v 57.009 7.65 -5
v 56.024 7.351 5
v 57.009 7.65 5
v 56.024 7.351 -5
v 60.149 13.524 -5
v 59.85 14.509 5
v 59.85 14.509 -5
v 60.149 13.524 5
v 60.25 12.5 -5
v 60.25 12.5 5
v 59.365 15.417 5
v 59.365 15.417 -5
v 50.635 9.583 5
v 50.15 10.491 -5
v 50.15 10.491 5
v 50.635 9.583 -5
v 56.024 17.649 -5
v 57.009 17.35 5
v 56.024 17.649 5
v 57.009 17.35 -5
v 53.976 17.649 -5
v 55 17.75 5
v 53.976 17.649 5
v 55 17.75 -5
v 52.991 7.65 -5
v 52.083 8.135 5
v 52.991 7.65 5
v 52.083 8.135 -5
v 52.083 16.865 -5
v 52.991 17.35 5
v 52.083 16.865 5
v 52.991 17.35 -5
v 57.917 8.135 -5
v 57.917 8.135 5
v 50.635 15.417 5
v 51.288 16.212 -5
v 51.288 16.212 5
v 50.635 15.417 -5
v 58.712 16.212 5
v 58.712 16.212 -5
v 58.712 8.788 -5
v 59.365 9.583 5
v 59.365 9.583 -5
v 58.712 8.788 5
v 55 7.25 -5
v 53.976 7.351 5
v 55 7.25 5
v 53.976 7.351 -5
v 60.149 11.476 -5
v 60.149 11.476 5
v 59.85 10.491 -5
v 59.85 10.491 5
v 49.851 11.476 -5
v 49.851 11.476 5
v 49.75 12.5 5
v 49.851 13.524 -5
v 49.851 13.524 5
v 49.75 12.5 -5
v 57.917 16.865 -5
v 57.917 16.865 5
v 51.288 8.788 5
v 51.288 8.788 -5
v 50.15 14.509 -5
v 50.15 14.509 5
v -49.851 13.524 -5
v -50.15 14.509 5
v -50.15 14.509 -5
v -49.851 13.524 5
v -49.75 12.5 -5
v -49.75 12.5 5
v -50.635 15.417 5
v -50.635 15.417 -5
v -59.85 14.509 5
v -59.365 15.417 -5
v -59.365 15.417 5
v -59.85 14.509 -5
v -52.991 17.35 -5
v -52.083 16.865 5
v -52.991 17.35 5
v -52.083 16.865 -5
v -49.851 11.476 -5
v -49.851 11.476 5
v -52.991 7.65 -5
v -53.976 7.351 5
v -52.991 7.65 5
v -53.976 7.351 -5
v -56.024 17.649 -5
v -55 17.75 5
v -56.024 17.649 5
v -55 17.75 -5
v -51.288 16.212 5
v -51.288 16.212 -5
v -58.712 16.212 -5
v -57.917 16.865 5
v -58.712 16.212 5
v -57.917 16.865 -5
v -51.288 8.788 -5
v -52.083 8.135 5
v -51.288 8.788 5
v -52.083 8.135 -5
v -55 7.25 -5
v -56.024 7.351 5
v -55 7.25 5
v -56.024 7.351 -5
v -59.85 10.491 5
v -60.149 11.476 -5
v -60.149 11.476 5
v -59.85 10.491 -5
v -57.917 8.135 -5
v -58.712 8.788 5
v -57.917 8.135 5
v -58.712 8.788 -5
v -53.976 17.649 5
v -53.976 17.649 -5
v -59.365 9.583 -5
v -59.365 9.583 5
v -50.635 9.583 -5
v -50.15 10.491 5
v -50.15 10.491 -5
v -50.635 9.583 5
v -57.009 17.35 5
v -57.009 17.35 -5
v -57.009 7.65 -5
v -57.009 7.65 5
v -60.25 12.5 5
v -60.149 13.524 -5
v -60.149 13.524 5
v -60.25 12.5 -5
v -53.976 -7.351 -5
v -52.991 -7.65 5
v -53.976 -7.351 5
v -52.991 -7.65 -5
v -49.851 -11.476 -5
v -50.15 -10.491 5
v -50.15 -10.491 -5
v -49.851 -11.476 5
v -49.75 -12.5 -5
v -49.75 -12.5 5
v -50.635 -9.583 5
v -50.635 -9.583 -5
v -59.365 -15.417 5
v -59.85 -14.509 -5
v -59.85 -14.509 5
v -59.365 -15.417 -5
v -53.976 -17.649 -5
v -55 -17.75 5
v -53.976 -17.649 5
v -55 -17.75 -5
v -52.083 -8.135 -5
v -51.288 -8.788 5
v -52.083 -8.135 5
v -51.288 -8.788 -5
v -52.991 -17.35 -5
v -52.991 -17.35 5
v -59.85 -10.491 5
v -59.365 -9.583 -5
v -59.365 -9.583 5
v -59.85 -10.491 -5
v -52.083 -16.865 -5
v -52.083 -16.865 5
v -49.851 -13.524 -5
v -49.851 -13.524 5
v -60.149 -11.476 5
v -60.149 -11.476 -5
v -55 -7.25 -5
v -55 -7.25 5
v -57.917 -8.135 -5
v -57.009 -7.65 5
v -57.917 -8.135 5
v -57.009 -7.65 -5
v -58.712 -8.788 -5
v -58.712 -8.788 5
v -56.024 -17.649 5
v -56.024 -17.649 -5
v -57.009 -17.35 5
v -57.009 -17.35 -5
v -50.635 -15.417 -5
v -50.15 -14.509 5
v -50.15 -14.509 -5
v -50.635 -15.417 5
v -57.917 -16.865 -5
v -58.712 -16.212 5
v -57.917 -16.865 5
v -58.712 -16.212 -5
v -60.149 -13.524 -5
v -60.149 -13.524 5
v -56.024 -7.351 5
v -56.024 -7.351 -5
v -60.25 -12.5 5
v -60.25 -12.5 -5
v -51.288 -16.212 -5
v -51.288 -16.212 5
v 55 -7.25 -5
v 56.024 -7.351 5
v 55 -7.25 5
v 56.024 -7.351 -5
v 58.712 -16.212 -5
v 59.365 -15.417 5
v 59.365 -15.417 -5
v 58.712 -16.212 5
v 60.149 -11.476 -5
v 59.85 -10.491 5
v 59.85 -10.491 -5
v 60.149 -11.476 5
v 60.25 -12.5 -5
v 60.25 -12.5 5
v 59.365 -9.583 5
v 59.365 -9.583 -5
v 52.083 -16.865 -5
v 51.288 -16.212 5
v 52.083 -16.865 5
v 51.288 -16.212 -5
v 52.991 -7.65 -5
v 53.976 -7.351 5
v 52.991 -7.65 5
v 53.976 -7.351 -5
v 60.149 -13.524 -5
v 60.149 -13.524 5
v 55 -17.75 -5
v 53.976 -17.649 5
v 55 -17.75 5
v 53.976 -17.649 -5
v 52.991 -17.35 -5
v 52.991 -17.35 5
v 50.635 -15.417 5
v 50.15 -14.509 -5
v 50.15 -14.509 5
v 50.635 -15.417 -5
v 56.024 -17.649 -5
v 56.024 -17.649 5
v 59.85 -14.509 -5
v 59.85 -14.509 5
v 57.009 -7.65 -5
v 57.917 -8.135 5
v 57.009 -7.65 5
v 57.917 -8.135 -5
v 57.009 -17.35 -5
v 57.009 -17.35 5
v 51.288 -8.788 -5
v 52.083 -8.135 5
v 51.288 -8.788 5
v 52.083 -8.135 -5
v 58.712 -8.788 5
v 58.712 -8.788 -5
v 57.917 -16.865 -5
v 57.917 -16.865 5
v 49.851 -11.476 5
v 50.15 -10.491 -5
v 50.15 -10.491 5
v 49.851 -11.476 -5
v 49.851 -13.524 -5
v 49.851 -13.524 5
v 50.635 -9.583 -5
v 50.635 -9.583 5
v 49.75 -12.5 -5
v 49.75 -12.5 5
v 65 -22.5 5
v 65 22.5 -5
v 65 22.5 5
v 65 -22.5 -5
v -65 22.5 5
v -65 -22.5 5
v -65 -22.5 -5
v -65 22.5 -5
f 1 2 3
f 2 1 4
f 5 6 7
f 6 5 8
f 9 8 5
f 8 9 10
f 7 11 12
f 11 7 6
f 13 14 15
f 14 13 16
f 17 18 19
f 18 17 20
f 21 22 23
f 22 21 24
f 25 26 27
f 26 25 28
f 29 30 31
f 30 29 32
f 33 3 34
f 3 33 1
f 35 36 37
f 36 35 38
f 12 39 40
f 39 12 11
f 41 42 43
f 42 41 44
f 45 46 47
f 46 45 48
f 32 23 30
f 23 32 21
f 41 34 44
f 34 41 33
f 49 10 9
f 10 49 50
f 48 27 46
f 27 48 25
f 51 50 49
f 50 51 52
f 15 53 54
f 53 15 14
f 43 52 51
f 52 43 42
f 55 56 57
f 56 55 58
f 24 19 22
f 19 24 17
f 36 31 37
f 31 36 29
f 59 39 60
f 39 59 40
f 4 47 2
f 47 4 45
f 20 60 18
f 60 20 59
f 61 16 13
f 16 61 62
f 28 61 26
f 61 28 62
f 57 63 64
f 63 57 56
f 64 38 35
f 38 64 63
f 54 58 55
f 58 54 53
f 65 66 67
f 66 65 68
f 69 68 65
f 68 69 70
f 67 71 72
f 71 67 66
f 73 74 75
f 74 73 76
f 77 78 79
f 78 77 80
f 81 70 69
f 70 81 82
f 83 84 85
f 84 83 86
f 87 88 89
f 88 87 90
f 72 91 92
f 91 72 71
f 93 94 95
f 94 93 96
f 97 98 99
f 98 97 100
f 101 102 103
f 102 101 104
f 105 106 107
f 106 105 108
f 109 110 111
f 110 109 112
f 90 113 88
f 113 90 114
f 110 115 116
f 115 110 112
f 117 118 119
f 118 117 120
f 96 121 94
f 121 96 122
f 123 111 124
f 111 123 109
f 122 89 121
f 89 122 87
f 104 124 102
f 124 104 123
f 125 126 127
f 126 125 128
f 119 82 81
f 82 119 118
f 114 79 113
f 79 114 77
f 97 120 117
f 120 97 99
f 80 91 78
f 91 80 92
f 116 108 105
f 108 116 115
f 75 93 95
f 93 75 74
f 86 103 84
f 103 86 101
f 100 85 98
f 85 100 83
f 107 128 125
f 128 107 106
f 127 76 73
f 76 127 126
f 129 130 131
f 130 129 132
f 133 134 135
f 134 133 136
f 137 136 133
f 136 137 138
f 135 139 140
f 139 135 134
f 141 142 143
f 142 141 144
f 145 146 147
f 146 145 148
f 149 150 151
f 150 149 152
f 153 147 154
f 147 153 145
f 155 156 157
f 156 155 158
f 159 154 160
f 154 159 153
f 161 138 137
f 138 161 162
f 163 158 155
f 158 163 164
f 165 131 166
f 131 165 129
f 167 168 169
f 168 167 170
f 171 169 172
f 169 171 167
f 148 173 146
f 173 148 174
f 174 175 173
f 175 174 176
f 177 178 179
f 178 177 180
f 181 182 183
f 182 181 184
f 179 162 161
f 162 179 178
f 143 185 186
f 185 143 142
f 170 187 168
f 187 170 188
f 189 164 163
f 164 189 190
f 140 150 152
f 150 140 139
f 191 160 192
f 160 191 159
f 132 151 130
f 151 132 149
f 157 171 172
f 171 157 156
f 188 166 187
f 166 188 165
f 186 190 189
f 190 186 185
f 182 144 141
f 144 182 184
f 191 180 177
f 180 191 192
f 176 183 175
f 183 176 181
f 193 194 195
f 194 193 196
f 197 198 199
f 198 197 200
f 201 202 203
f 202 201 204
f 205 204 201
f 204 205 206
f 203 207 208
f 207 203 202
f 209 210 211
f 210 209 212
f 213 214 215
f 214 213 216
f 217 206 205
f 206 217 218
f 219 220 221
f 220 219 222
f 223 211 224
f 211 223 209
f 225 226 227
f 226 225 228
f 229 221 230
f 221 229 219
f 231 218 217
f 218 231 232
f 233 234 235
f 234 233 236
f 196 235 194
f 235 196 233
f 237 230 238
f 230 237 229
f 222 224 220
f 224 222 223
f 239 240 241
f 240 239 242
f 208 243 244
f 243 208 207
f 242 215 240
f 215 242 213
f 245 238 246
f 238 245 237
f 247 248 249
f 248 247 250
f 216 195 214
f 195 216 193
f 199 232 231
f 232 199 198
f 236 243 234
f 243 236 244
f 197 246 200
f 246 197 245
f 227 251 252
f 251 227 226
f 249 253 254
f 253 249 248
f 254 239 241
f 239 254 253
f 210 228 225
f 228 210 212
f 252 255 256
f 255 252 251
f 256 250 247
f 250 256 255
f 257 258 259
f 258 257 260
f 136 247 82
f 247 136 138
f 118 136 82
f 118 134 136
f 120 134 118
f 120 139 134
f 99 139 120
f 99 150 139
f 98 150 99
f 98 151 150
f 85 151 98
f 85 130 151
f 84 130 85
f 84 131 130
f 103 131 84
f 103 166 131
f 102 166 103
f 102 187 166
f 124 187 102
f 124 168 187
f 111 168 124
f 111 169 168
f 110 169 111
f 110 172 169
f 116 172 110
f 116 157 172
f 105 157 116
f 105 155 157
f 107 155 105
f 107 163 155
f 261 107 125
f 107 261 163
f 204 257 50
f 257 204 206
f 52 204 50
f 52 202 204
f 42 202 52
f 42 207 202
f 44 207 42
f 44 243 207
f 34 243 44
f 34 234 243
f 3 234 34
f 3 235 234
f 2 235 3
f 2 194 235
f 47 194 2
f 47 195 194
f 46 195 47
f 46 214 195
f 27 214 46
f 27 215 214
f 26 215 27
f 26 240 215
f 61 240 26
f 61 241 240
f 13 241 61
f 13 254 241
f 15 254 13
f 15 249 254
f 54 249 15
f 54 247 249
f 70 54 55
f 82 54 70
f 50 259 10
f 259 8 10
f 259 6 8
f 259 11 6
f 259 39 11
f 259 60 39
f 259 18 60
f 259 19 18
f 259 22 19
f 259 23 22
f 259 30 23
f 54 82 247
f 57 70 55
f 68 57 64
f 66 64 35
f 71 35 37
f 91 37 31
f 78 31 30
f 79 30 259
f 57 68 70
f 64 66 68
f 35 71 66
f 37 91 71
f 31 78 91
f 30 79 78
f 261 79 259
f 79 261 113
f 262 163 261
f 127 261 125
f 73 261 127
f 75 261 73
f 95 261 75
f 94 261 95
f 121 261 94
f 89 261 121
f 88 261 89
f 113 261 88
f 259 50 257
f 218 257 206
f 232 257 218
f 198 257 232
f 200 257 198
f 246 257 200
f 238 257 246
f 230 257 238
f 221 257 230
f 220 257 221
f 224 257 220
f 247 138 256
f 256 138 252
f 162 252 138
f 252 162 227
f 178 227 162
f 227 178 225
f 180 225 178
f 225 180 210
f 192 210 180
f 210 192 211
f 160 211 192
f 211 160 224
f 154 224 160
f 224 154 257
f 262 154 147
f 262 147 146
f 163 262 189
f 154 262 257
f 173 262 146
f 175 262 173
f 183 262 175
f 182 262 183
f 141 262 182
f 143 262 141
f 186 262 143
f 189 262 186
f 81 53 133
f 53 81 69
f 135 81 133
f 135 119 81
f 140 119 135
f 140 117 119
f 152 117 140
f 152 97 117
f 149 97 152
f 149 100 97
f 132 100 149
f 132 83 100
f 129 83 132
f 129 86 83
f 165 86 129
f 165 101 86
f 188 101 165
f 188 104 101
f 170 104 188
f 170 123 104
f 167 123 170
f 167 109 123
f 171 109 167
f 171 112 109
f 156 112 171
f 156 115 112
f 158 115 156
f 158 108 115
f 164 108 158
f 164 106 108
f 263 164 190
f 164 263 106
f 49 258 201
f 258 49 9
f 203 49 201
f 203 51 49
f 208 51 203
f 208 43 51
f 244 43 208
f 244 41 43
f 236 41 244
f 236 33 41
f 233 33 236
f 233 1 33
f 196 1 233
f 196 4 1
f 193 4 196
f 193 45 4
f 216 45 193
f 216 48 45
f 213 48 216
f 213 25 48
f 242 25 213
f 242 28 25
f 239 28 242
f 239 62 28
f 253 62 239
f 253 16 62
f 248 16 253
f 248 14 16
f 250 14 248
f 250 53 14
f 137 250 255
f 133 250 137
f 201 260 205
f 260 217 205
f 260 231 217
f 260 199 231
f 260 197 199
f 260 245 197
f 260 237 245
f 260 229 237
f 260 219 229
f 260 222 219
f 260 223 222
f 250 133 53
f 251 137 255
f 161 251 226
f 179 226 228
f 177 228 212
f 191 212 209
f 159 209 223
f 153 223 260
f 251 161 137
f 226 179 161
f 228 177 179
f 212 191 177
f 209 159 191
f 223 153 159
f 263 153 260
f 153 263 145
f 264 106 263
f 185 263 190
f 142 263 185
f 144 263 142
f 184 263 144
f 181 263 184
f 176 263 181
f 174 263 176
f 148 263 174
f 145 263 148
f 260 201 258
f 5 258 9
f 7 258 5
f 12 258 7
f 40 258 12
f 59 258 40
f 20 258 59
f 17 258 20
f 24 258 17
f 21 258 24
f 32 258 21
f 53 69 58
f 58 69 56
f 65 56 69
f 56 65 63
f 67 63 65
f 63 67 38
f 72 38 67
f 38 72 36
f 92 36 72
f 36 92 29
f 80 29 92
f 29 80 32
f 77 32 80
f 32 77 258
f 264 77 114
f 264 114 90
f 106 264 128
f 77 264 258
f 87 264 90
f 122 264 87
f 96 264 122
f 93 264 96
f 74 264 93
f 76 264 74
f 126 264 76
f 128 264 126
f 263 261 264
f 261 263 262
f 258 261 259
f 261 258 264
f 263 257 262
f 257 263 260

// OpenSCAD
$fn = 32;

// ----------------------------------------------------------------------
// Corner plate 130 x 45 x 10
// 4 holes, centres taken from the edge offset
// ----------------------------------------------------------------------

// --- parameters (mm) ---
plate = [130, 45, 10];  // overall size (x, y, z)
holes = 4;              // number of holes the drawing asks for
hole_d = 10.5;          // hole diameter
edge = 10;              // hole centre offset from the plate edge

// --- derived feature positions (mm) ---
corner_x = plate[0] / 2 - edge;  // = 55   corner hole X
corner_y = plate[1] / 2 - edge;  // = 12.5   corner hole Y
feature_centers = [
  [corner_x, corner_y],
  [-corner_x, corner_y],
  [-corner_x, -corner_y],
  [corner_x, -corner_y]
];   // hole centres the loop below drills

// plate outline, every hole drilled through with the same cutters
difference() {
  cube(plate, center = true);
  for (centre = feature_centers)
    translate([centre[0], centre[1], 0])
      cylinder(d = hole_d, h = plate[2] + 2, center = true);
}
